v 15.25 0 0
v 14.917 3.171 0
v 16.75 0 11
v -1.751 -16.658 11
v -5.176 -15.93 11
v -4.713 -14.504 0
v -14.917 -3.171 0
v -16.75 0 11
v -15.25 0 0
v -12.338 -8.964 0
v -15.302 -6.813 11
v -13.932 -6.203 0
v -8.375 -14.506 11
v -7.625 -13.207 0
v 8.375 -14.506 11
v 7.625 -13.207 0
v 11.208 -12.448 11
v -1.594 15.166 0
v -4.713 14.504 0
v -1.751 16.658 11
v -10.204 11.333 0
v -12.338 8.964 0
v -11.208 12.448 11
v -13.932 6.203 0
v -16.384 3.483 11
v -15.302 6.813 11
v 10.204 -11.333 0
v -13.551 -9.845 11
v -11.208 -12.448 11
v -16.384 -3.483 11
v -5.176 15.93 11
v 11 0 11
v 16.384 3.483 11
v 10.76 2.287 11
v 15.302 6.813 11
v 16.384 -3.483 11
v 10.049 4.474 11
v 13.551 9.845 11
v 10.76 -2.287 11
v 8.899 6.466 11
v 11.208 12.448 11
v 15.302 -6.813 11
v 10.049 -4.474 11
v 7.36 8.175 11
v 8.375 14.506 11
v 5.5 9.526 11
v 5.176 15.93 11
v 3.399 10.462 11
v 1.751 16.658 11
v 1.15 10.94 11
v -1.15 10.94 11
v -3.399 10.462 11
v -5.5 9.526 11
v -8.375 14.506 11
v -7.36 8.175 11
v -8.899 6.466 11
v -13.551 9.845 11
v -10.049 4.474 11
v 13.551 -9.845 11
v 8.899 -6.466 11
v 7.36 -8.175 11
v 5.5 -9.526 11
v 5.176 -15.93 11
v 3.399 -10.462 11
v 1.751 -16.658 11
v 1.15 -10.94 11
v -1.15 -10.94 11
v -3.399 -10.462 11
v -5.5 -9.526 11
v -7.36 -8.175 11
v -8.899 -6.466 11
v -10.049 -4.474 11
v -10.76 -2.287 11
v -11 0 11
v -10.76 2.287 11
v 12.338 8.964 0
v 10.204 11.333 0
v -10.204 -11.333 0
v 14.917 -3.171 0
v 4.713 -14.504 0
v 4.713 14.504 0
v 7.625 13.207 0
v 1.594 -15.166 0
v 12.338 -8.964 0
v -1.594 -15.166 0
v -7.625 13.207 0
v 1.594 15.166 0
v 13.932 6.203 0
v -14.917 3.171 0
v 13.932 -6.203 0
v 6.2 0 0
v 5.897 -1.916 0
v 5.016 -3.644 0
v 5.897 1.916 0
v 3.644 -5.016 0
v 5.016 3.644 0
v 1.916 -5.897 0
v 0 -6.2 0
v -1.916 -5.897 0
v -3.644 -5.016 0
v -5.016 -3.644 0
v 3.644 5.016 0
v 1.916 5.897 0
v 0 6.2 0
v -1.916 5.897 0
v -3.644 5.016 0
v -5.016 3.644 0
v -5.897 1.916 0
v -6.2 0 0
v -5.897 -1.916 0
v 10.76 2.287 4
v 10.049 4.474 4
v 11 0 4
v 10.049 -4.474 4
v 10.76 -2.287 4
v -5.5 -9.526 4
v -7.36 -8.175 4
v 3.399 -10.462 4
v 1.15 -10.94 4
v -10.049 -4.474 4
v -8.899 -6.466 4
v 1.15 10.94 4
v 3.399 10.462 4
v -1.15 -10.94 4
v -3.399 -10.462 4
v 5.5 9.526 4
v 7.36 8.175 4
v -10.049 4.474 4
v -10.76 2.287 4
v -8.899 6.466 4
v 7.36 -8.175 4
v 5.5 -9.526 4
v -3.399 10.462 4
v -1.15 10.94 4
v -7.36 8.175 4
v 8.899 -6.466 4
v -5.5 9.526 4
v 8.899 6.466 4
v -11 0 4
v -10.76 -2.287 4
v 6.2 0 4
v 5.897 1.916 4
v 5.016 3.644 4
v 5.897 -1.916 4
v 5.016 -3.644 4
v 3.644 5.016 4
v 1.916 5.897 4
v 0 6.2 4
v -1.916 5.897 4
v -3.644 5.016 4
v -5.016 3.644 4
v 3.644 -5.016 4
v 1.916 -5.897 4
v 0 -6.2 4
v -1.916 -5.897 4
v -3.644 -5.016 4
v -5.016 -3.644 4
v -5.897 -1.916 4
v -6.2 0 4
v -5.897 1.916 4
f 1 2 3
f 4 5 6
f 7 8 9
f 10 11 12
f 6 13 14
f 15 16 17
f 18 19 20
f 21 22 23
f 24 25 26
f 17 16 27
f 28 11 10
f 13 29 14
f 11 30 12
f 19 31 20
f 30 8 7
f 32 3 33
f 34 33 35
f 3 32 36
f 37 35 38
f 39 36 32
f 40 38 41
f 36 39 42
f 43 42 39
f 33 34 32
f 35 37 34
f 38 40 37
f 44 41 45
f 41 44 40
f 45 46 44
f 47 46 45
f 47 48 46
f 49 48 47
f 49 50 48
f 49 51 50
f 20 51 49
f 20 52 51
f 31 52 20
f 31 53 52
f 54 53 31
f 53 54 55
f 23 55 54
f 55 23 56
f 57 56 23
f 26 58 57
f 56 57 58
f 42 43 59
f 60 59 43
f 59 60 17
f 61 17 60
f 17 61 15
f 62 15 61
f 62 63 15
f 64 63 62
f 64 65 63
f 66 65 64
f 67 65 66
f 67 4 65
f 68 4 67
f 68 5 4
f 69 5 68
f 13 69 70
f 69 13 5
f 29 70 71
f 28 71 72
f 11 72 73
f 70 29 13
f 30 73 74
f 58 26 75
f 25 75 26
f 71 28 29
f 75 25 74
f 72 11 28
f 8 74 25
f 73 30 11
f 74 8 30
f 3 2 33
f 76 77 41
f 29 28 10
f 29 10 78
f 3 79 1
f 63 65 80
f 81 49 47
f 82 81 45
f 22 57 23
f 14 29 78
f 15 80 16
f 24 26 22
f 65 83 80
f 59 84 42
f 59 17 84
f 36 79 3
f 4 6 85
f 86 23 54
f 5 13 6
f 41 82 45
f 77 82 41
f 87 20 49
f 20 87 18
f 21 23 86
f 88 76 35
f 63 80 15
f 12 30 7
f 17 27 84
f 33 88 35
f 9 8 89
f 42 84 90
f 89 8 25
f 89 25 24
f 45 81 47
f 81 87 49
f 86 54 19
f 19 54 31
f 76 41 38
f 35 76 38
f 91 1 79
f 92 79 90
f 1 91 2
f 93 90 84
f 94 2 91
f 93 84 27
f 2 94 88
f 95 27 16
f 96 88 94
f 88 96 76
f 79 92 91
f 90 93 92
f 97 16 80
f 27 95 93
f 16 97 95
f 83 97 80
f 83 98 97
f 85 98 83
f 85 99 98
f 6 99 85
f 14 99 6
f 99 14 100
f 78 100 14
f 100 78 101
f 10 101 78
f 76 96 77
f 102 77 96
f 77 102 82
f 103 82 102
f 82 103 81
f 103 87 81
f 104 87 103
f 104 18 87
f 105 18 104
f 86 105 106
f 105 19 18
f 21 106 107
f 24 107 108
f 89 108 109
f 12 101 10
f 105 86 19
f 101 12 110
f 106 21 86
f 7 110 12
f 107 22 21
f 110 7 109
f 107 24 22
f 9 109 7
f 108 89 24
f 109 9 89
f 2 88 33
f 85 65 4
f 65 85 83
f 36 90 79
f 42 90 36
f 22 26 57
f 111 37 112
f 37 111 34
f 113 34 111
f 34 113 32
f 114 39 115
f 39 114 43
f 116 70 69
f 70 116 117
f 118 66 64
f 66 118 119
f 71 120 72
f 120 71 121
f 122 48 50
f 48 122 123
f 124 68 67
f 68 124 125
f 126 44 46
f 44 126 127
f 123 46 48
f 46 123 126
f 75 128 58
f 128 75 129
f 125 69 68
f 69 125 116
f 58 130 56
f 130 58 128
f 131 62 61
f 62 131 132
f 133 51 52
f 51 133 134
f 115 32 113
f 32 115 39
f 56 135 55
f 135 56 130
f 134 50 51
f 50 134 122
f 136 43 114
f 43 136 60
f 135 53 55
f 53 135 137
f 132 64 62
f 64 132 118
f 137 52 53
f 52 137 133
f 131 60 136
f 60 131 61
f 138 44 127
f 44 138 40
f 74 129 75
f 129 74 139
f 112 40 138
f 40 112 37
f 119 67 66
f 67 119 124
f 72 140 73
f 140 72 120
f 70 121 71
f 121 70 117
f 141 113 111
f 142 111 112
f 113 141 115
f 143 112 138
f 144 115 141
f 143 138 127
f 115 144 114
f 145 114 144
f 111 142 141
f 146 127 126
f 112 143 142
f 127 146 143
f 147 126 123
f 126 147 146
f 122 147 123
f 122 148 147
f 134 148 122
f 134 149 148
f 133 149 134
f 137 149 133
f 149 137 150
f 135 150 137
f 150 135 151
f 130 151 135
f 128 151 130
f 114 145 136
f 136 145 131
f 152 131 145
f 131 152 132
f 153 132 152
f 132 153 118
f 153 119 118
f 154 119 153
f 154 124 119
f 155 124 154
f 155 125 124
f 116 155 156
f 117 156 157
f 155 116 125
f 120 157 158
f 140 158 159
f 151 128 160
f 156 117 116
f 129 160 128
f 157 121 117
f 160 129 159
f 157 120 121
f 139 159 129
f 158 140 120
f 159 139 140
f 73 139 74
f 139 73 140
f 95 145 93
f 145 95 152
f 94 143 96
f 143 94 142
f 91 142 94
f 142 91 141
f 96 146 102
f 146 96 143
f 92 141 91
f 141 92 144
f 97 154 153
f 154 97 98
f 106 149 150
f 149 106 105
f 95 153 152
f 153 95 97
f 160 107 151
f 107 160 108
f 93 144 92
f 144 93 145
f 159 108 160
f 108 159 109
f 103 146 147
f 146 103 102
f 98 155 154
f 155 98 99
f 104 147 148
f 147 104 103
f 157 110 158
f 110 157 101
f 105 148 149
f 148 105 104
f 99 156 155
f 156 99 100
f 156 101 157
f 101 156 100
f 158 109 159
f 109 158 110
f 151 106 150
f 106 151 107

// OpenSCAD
// [FL_INDEX: keywords="openscad, 3d_parametric, Spool_Bearing_Plug, csg_solid" | COT="Parametric OpenSCAD design from 3DCodeverse"]
// Title: Spool Bearing Plug

//By Dan Finlay, 2013
//dan@danfinlay.com

bearing_outer_diameter = 22;
bearing_width = 7;
bearing_hole_diameter = 8;

spool_diameter = 32;

wedge_difference = 1.5;

module bearing_hole(){
	translate([0,0,4])
	cylinder(r=bearing_outer_diameter/2, h=bearing_width);
}

module axle_hole(){
	cylinder(r=(bearing_hole_diameter/2)+2.2, h=bearing_width*2);
}

module main_area(){
	union(){
		difference(){
			cylinder(r1=(spool_diameter/2)-(wedge_difference/2), r2=(spool_diameter/2)+(wedge_difference/2), h=bearing_width+4);
			translate([0,0,4]) cylinder(r1=(spool_diameter/2)-5-(wedge_difference/2), r2=(spool_diameter/2)-5+(wedge_difference/2), h=bearing_width);
		}
		translate([0,0,4])
			cylinder(r=(bearing_outer_diameter/2)+3, h=bearing_width);
	}
}

difference(){
	main_area();
	bearing_hole();
	axle_hole();
}
